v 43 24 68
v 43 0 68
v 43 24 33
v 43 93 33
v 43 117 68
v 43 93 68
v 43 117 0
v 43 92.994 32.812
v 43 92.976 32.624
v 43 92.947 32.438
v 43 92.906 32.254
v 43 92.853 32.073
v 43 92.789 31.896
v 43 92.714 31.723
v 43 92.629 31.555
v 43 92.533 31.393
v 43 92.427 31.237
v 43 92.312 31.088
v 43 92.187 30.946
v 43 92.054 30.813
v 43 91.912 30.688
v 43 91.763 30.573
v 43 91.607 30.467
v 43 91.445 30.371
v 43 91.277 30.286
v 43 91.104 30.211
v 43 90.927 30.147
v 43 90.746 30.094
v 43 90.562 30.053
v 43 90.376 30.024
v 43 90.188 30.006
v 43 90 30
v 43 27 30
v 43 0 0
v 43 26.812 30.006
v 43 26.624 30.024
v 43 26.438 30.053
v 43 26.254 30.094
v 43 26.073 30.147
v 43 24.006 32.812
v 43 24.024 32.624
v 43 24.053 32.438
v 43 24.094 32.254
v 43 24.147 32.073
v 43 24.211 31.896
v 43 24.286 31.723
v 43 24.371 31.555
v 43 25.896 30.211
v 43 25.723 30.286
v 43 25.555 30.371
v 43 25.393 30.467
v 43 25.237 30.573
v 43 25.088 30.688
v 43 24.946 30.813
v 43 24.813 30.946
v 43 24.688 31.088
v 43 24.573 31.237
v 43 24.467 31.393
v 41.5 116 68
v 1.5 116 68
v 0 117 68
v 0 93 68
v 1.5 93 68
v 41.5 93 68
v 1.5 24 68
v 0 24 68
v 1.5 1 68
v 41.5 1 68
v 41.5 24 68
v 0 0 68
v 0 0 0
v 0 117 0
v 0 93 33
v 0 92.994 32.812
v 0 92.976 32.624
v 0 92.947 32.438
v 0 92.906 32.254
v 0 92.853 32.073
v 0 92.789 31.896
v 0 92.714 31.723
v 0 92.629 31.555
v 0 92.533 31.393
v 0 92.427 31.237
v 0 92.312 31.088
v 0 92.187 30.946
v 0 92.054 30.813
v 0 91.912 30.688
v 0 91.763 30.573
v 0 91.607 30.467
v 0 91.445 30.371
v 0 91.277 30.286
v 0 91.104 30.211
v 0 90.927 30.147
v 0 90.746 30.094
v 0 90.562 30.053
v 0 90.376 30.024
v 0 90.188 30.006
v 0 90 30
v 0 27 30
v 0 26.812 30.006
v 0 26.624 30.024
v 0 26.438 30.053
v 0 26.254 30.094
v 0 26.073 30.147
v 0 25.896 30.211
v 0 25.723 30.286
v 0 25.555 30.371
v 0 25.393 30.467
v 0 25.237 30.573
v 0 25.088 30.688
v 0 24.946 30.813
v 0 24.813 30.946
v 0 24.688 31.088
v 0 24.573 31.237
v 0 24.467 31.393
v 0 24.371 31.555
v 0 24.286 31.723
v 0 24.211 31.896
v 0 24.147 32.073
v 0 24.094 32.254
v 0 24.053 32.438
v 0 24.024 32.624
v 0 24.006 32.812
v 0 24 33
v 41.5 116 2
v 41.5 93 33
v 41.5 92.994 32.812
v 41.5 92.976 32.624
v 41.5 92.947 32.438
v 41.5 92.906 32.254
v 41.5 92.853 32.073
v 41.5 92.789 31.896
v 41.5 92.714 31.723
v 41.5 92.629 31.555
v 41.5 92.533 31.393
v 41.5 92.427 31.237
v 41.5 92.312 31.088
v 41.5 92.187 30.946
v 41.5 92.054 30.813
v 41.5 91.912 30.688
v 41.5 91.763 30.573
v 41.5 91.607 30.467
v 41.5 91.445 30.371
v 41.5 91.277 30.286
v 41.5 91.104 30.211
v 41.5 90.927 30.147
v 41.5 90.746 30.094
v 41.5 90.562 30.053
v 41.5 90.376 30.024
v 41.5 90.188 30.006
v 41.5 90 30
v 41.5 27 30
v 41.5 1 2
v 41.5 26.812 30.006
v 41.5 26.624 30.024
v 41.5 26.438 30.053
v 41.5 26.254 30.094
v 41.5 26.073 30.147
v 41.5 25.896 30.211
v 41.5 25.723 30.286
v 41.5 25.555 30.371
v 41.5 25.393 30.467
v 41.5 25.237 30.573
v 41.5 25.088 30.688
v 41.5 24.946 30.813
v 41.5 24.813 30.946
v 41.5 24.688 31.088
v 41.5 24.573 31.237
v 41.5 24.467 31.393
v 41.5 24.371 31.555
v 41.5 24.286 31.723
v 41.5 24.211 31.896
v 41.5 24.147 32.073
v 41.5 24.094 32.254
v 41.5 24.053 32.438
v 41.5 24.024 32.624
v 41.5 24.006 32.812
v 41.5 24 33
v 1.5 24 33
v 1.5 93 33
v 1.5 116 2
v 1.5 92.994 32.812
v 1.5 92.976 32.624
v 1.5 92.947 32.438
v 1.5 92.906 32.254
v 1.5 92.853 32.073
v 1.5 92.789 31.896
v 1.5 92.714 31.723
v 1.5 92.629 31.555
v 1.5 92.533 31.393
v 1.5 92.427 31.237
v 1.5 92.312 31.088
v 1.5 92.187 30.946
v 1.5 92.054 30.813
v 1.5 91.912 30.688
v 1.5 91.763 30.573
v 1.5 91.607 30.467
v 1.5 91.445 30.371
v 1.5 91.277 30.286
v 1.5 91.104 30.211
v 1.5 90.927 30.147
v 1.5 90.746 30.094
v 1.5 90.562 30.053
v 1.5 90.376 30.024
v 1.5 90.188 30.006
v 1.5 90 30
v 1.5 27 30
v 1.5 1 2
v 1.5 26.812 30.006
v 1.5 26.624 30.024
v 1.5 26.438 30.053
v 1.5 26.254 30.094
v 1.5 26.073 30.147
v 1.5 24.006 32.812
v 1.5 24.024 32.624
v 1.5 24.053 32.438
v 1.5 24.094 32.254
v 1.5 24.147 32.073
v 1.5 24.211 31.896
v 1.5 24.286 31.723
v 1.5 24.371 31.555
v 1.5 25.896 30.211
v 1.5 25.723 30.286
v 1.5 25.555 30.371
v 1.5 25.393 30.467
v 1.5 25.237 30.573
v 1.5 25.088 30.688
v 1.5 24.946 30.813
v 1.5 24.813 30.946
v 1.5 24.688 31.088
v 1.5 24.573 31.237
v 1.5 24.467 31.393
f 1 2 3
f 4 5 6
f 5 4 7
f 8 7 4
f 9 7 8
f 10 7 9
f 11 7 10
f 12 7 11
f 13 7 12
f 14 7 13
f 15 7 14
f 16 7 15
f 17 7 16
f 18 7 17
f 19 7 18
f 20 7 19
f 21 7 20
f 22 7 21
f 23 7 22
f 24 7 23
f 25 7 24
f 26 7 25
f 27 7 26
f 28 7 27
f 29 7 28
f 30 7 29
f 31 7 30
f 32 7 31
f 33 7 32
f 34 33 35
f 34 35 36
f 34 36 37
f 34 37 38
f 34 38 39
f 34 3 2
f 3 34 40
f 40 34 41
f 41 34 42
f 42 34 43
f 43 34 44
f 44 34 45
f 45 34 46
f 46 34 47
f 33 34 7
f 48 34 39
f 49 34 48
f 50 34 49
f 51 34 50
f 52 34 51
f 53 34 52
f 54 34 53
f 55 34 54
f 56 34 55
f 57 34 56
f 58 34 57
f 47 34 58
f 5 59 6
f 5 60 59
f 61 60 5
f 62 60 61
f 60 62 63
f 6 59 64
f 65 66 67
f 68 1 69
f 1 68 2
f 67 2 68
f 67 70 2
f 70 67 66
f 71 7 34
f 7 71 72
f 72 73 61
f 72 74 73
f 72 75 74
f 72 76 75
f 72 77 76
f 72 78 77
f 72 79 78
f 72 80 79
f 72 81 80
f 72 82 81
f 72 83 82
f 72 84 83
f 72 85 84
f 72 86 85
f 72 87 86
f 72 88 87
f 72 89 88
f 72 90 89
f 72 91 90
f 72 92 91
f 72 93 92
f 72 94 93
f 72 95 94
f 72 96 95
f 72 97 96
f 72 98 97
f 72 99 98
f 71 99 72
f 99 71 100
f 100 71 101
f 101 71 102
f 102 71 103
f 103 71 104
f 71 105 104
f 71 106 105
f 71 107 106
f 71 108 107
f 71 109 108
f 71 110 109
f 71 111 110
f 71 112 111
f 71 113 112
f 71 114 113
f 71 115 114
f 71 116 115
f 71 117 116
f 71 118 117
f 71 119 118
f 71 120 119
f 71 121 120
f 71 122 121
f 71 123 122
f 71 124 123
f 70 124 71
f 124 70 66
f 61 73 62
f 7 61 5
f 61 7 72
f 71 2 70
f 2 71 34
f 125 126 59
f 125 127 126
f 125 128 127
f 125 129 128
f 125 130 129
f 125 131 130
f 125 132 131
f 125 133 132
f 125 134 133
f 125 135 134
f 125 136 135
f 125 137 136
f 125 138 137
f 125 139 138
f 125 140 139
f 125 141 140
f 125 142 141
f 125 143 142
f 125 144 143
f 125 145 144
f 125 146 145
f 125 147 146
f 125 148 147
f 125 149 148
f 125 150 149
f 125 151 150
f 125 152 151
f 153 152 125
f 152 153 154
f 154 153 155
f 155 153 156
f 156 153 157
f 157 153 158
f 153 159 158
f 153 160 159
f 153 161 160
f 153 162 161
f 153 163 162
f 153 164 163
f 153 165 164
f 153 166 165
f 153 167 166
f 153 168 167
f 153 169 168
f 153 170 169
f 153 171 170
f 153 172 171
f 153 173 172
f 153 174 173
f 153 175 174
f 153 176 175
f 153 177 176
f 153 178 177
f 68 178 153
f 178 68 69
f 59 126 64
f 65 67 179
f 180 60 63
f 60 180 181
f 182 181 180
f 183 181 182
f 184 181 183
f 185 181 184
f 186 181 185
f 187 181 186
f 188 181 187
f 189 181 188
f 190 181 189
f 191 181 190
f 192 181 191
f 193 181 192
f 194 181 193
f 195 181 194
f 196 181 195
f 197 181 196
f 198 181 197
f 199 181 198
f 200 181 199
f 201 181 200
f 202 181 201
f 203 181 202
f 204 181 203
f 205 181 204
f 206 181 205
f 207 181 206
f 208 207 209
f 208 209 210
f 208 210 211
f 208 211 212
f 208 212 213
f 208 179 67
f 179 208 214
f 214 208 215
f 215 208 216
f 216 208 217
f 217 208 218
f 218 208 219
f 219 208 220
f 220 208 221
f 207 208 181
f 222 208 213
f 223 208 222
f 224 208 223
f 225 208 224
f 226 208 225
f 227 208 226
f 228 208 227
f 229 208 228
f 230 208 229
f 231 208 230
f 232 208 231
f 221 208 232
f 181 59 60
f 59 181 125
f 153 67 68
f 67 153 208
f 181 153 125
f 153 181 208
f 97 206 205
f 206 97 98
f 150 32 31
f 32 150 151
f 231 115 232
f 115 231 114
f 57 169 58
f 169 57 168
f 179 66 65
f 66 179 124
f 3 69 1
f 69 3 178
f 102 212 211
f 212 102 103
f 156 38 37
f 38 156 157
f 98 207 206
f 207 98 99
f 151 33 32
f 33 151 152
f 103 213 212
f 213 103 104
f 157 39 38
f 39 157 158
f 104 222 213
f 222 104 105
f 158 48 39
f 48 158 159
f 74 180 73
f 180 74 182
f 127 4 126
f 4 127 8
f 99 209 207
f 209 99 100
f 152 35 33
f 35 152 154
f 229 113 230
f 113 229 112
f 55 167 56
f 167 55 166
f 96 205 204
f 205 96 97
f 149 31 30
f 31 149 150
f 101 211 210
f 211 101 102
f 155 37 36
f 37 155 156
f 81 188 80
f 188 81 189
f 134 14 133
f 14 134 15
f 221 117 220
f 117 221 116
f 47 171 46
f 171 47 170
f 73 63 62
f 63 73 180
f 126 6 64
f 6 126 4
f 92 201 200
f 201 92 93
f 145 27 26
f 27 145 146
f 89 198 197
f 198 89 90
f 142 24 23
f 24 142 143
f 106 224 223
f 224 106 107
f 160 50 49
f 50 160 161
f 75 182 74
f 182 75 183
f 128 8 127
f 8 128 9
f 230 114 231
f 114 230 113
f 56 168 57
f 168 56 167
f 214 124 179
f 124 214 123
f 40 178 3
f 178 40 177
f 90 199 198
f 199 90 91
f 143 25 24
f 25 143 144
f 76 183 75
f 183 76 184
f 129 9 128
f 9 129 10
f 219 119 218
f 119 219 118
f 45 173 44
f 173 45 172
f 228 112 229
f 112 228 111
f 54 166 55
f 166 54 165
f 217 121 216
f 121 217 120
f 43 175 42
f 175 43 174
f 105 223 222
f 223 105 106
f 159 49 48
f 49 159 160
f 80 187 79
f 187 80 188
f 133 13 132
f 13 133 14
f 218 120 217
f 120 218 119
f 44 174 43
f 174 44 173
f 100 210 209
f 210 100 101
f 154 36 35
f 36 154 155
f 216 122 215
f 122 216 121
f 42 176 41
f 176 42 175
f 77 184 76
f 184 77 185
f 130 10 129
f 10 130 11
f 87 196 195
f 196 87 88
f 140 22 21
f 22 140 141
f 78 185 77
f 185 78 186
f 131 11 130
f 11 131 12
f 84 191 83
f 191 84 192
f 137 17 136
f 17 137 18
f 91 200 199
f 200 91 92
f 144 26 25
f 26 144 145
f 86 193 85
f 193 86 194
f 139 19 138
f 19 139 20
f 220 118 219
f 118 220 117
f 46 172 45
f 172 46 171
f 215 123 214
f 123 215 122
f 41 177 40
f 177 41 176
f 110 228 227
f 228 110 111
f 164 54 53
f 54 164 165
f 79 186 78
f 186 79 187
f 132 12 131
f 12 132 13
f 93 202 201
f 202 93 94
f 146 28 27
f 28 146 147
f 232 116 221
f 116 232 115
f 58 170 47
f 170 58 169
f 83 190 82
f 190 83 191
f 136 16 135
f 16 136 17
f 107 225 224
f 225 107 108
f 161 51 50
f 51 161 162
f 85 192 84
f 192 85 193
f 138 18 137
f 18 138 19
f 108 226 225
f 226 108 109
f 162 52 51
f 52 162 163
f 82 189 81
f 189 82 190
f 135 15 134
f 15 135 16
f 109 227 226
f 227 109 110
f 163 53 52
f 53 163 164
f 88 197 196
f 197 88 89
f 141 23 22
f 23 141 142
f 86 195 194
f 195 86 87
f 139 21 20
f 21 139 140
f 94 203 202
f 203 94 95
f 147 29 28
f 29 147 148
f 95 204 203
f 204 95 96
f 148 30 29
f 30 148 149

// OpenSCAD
include <../lib/boardgame_insert_toolkit_lib.2.scad>;

// determines whether lids are output.
g_b_print_lid = true;

// determines whether boxes are output.
g_b_print_box = true; 

// Focus on one box
g_isolated_print_box = ""; 

// Used to visualize how all of the boxes fit together. 
g_b_visualization = false;          
        
// this is the outer wall thickness. 
//Default = 1.5mm
g_wall_thickness = 1.5;

// The tolerance value is extra space put between planes of the lid and box that fit together.
// Increase the tolerance to loosen the fit and decrease it to tighten it.
//
// Note that the tolerance is applied exclusively to the lid.
// So if the lid is too tight or too loose, change this value ( up for looser fit, down for tighter fit ) and 
// you only need to reprint the lid.
// 
// The exception is the stackable box, where the bottom of the box is the lid of the box below,
// in which case the tolerance also affects that box bottom.
//
g_tolerance = 0.15;

// This adjusts the position of the lid detents downward. 
// The larger the value, the bigger the gap between the lid and the box.
g_tolerance_detents_pos = 0.1;

// This determines whether the default single material version is output, or, if printing in multiple materials, 
// which layer to output.
//
g_print_mmu_layer = "default"; // [ "default" | "mmu_box_layer" | "mmu_label_layer" ]

data =
[
    [   "Ships",
        [
            [ BOX_SIZE_XYZ,[43, 117, 68] ],
            [ BOX_NO_LID_B,
                [
                    [ ],
                ]
            ],
            [ BOX_COMPONENT,
                [
                    [ CMP_SHAPE, SQUARE ],
                    [ CMP_NUM_COMPARTMENTS_XY, [1, 1] ],
                    [ CMP_COMPARTMENT_SIZE_XYZ, [ 40, 115, 66] ],
                    [ CMP_CUTOUT_SIDES_4B, [f,f,t,t]],
                    [ CMP_CUTOUT_HEIGHT_PCT, 50 ],
                    [ CMP_CUTOUT_WIDTH_PCT, 60 ],
                    [ CMP_CUTOUT_TYPE, BOTH ],
                ]
            ],

        ]
    ],
];


MakeAll();
